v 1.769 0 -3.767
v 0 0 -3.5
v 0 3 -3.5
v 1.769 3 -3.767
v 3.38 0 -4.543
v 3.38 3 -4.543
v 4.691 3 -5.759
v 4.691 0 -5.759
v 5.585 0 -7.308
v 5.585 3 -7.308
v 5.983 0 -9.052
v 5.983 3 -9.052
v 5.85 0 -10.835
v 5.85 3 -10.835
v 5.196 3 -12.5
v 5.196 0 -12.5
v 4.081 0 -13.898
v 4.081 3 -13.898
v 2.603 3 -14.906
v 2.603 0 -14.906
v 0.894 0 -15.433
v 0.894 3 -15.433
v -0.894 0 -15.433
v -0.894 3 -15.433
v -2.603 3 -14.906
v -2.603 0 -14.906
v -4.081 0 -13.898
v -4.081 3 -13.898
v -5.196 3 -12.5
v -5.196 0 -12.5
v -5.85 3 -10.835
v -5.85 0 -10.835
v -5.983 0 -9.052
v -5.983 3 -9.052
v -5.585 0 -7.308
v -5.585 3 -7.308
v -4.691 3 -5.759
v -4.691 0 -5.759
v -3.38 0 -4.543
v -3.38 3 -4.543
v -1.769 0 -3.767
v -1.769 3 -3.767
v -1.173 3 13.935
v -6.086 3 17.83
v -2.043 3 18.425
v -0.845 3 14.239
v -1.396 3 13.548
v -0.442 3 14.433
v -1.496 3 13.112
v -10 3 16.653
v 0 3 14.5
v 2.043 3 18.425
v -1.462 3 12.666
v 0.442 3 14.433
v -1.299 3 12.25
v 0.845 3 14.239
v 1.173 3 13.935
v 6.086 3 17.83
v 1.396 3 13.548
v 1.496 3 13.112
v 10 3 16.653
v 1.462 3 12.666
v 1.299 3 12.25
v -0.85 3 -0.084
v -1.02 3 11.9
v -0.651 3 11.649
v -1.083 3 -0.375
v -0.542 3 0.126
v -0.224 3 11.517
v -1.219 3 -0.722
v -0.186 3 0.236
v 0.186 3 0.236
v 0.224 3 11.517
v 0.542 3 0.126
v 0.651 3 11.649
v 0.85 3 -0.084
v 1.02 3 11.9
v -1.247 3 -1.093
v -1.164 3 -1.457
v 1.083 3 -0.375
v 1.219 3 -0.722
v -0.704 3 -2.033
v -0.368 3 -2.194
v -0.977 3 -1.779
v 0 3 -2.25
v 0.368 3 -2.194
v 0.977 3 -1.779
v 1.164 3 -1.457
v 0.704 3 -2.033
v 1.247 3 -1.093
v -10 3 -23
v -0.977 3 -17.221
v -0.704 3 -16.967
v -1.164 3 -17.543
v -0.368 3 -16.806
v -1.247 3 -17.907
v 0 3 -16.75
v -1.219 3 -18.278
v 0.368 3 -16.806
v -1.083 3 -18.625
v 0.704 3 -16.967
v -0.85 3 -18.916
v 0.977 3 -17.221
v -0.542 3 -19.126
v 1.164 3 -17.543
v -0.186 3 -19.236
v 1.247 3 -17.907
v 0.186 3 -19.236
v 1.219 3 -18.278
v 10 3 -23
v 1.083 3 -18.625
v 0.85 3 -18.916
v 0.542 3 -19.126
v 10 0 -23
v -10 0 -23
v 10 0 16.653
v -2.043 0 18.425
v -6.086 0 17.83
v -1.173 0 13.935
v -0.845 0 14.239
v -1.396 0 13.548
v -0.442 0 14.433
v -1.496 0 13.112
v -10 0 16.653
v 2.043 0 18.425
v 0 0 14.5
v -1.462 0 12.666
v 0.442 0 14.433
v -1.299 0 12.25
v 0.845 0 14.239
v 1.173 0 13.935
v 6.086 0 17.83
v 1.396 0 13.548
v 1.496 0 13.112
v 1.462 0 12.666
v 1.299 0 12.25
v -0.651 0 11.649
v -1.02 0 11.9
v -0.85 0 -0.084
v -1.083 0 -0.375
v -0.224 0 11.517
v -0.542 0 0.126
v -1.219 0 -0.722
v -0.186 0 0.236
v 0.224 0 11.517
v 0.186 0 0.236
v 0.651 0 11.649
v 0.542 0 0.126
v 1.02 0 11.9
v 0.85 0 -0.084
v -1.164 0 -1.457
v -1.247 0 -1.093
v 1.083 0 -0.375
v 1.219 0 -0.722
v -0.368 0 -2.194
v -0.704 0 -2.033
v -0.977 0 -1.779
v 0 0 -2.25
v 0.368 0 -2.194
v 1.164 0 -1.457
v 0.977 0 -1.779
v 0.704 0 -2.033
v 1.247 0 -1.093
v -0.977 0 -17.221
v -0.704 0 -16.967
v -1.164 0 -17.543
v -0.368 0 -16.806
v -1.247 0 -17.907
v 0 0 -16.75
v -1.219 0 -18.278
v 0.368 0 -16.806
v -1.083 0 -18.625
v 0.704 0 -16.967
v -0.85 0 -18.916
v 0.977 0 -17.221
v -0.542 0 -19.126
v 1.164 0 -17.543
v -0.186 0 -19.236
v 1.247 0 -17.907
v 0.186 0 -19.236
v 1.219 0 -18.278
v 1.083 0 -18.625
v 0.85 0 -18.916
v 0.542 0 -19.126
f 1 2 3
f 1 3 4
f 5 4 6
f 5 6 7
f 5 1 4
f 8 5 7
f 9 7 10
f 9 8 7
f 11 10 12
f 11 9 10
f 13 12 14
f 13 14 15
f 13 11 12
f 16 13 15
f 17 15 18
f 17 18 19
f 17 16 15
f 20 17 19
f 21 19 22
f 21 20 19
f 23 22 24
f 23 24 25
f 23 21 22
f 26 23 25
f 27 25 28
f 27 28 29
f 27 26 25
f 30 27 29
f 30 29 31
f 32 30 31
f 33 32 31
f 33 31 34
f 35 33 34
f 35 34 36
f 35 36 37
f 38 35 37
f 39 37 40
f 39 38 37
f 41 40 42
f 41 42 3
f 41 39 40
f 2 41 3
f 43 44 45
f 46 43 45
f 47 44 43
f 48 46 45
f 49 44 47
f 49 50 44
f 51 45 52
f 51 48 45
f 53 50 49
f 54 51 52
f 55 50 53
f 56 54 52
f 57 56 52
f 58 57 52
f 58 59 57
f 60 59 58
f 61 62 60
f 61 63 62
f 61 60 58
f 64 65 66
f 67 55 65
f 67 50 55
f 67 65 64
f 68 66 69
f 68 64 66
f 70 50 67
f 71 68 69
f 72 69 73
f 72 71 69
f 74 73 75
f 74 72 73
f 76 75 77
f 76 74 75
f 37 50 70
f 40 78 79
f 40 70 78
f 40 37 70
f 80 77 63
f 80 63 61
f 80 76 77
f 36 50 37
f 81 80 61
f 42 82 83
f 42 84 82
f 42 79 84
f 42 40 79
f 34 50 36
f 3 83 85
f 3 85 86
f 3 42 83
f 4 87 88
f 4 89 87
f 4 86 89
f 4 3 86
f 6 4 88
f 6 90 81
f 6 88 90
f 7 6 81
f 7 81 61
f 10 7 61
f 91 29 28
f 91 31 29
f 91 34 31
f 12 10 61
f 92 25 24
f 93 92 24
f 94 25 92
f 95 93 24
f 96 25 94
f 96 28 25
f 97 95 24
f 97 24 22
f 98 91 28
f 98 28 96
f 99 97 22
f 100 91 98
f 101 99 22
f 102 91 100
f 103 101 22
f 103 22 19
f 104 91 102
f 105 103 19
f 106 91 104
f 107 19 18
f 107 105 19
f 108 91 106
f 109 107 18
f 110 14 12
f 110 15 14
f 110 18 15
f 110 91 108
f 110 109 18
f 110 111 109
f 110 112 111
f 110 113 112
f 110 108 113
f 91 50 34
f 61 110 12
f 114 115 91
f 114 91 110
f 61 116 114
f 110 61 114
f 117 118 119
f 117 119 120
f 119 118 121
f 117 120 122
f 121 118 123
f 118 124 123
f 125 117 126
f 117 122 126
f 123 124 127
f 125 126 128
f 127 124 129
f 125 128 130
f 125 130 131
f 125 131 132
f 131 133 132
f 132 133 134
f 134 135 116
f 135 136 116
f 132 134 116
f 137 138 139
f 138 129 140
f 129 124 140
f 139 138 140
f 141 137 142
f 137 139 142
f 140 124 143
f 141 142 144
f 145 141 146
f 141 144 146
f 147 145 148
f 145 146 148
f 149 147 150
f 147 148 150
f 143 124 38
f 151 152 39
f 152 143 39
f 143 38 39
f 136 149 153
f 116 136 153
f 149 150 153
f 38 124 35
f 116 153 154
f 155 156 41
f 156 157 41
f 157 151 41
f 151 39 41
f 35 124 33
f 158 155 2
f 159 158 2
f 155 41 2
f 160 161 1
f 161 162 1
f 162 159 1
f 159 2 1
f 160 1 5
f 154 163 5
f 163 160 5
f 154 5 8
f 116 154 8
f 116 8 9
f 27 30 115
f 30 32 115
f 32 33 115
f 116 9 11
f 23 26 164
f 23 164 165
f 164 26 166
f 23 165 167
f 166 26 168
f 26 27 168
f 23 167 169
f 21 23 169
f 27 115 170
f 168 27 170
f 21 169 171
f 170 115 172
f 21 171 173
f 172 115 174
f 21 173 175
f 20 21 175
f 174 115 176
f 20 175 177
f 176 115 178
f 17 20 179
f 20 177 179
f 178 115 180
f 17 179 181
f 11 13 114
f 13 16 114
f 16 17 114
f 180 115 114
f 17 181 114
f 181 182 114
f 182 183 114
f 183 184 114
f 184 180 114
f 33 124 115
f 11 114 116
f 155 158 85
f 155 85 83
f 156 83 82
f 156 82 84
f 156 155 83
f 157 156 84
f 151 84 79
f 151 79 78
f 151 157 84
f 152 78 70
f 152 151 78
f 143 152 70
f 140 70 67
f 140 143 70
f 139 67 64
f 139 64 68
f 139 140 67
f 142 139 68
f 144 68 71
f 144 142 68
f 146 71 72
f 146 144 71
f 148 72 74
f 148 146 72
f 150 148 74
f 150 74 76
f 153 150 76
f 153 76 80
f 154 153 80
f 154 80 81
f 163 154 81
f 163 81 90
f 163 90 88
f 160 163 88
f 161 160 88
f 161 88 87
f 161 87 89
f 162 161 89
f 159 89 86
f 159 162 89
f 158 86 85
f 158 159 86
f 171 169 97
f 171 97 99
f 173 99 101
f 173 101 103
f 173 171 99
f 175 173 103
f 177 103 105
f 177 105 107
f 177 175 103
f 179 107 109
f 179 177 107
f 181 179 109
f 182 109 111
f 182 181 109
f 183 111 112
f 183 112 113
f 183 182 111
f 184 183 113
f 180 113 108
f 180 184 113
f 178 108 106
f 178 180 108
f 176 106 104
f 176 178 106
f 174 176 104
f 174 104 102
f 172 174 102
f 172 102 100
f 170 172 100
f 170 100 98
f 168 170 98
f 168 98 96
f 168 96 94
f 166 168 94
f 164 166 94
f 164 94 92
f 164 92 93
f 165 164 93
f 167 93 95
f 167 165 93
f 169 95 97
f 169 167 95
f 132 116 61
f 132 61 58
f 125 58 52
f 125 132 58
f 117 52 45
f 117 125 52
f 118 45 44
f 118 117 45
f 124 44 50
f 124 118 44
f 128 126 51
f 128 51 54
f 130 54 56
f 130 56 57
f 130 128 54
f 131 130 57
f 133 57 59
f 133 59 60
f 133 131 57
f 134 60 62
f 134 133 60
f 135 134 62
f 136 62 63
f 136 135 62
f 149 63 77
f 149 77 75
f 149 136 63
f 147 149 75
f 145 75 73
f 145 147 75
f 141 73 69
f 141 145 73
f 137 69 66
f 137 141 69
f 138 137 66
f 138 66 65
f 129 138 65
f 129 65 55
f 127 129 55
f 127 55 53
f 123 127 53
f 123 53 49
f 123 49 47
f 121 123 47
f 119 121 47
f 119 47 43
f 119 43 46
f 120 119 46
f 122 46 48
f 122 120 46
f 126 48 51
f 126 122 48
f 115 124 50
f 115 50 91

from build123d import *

# Parameters (mm, degrees)
SKETCH1_W               = 20
SKETCH1_H               = 46
SKETCH1_R               = 1.25
SKETCH1_R_2             = 6
SKETCH1_R_3             = 1.5
BOSS_EXTRUDE1_DEPTH     = 3
CUT_EXTRUDE1_DEPTH      = 26.258661881
CUT_EXTRUDE1_DEPTH_BACK = 26.258661881
SKETCH2_W               = 20
SKETCH2_H               = 13.653393661


with BuildPart() as part:
    # Sketch1 → Boss-Extrude1 (new body)
    with BuildSketch(Plane(origin=(0, 0, 0), x_dir=(1, 0, 0), z_dir=(0, 1, 0))):
        Rectangle(SKETCH1_W, SKETCH1_H)
        with Locations(Location((0, 18, 0), (0, 0, 270))):
            Circle(SKETCH1_R, mode=Mode.SUBTRACT)
        with Locations(Location((0, 9.5, 0), (0, 0, 270))):
            Circle(SKETCH1_R_2, mode=Mode.SUBTRACT)
        with Locations(Location((0, 1, 0), (0, 0, 90))):
            Circle(SKETCH1_R, mode=Mode.SUBTRACT)
        with Locations(Location((0, -13, 0), (0, 0, 270))):
            Circle(SKETCH1_R_3, mode=Mode.SUBTRACT)
    extrude(amount=BOSS_EXTRUDE1_DEPTH)

    # Sketch2 → Cut-Extrude1 (cut, two sides: drawn at the far end of the back side and taken through both)
    with BuildSketch(Plane(origin=(0, 3, 0), x_dir=(1, 0, 0), z_dir=(0, 1, 0)).offset(-CUT_EXTRUDE1_DEPTH_BACK)):
        with Locations((0, -29.826696831)):
            Rectangle(SKETCH2_W, SKETCH2_H)
        with BuildLine():
            ThreePointArc((10, -16.653393661), (0, -18.5), (-10, -16.653393661))
            Line((-10, -16.653393661), (-10, -23))
            Line((-10, -23), (10, -23))
            Line((10, -23), (10, -16.653393661))
        make_face()
    extrude(amount=CUT_EXTRUDE1_DEPTH + CUT_EXTRUDE1_DEPTH_BACK, mode=Mode.SUBTRACT)


solid = part.part
